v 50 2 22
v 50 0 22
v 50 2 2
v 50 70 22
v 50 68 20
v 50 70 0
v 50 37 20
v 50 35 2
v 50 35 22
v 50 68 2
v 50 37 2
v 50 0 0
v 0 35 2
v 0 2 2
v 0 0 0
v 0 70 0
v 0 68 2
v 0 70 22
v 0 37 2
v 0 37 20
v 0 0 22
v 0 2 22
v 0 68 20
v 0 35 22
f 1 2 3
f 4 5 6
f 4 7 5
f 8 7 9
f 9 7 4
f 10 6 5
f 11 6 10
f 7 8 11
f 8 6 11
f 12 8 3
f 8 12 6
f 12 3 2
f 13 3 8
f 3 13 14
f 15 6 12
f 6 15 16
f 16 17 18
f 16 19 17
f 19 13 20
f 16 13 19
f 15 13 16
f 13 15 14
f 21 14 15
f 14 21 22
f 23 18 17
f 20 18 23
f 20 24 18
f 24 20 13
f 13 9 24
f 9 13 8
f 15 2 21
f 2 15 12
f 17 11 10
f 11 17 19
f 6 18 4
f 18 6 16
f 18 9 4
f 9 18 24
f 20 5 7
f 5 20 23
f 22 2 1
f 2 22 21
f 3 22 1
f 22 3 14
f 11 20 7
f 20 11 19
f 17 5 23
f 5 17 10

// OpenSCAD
$fn=50;

width=50.0;
height=70.0;
depth=20.0;
thickness=2.0;

cube([width, height / 2 * 1, thickness]);
translate([0, height / 2 * 1, 0])
    cube([width, height / 2 * 1, thickness]);
translate([0, height / 2 * 1, depth])
    cube([width, height / 2 * 1, thickness]);

translate([0, 0, thickness])
    cube([width, thickness, depth]);
translate([0, height / 2 * 1, 0])
    cube([width, thickness, depth]);
translate([0, height-thickness, 0])
    cube([width, thickness, depth]);
